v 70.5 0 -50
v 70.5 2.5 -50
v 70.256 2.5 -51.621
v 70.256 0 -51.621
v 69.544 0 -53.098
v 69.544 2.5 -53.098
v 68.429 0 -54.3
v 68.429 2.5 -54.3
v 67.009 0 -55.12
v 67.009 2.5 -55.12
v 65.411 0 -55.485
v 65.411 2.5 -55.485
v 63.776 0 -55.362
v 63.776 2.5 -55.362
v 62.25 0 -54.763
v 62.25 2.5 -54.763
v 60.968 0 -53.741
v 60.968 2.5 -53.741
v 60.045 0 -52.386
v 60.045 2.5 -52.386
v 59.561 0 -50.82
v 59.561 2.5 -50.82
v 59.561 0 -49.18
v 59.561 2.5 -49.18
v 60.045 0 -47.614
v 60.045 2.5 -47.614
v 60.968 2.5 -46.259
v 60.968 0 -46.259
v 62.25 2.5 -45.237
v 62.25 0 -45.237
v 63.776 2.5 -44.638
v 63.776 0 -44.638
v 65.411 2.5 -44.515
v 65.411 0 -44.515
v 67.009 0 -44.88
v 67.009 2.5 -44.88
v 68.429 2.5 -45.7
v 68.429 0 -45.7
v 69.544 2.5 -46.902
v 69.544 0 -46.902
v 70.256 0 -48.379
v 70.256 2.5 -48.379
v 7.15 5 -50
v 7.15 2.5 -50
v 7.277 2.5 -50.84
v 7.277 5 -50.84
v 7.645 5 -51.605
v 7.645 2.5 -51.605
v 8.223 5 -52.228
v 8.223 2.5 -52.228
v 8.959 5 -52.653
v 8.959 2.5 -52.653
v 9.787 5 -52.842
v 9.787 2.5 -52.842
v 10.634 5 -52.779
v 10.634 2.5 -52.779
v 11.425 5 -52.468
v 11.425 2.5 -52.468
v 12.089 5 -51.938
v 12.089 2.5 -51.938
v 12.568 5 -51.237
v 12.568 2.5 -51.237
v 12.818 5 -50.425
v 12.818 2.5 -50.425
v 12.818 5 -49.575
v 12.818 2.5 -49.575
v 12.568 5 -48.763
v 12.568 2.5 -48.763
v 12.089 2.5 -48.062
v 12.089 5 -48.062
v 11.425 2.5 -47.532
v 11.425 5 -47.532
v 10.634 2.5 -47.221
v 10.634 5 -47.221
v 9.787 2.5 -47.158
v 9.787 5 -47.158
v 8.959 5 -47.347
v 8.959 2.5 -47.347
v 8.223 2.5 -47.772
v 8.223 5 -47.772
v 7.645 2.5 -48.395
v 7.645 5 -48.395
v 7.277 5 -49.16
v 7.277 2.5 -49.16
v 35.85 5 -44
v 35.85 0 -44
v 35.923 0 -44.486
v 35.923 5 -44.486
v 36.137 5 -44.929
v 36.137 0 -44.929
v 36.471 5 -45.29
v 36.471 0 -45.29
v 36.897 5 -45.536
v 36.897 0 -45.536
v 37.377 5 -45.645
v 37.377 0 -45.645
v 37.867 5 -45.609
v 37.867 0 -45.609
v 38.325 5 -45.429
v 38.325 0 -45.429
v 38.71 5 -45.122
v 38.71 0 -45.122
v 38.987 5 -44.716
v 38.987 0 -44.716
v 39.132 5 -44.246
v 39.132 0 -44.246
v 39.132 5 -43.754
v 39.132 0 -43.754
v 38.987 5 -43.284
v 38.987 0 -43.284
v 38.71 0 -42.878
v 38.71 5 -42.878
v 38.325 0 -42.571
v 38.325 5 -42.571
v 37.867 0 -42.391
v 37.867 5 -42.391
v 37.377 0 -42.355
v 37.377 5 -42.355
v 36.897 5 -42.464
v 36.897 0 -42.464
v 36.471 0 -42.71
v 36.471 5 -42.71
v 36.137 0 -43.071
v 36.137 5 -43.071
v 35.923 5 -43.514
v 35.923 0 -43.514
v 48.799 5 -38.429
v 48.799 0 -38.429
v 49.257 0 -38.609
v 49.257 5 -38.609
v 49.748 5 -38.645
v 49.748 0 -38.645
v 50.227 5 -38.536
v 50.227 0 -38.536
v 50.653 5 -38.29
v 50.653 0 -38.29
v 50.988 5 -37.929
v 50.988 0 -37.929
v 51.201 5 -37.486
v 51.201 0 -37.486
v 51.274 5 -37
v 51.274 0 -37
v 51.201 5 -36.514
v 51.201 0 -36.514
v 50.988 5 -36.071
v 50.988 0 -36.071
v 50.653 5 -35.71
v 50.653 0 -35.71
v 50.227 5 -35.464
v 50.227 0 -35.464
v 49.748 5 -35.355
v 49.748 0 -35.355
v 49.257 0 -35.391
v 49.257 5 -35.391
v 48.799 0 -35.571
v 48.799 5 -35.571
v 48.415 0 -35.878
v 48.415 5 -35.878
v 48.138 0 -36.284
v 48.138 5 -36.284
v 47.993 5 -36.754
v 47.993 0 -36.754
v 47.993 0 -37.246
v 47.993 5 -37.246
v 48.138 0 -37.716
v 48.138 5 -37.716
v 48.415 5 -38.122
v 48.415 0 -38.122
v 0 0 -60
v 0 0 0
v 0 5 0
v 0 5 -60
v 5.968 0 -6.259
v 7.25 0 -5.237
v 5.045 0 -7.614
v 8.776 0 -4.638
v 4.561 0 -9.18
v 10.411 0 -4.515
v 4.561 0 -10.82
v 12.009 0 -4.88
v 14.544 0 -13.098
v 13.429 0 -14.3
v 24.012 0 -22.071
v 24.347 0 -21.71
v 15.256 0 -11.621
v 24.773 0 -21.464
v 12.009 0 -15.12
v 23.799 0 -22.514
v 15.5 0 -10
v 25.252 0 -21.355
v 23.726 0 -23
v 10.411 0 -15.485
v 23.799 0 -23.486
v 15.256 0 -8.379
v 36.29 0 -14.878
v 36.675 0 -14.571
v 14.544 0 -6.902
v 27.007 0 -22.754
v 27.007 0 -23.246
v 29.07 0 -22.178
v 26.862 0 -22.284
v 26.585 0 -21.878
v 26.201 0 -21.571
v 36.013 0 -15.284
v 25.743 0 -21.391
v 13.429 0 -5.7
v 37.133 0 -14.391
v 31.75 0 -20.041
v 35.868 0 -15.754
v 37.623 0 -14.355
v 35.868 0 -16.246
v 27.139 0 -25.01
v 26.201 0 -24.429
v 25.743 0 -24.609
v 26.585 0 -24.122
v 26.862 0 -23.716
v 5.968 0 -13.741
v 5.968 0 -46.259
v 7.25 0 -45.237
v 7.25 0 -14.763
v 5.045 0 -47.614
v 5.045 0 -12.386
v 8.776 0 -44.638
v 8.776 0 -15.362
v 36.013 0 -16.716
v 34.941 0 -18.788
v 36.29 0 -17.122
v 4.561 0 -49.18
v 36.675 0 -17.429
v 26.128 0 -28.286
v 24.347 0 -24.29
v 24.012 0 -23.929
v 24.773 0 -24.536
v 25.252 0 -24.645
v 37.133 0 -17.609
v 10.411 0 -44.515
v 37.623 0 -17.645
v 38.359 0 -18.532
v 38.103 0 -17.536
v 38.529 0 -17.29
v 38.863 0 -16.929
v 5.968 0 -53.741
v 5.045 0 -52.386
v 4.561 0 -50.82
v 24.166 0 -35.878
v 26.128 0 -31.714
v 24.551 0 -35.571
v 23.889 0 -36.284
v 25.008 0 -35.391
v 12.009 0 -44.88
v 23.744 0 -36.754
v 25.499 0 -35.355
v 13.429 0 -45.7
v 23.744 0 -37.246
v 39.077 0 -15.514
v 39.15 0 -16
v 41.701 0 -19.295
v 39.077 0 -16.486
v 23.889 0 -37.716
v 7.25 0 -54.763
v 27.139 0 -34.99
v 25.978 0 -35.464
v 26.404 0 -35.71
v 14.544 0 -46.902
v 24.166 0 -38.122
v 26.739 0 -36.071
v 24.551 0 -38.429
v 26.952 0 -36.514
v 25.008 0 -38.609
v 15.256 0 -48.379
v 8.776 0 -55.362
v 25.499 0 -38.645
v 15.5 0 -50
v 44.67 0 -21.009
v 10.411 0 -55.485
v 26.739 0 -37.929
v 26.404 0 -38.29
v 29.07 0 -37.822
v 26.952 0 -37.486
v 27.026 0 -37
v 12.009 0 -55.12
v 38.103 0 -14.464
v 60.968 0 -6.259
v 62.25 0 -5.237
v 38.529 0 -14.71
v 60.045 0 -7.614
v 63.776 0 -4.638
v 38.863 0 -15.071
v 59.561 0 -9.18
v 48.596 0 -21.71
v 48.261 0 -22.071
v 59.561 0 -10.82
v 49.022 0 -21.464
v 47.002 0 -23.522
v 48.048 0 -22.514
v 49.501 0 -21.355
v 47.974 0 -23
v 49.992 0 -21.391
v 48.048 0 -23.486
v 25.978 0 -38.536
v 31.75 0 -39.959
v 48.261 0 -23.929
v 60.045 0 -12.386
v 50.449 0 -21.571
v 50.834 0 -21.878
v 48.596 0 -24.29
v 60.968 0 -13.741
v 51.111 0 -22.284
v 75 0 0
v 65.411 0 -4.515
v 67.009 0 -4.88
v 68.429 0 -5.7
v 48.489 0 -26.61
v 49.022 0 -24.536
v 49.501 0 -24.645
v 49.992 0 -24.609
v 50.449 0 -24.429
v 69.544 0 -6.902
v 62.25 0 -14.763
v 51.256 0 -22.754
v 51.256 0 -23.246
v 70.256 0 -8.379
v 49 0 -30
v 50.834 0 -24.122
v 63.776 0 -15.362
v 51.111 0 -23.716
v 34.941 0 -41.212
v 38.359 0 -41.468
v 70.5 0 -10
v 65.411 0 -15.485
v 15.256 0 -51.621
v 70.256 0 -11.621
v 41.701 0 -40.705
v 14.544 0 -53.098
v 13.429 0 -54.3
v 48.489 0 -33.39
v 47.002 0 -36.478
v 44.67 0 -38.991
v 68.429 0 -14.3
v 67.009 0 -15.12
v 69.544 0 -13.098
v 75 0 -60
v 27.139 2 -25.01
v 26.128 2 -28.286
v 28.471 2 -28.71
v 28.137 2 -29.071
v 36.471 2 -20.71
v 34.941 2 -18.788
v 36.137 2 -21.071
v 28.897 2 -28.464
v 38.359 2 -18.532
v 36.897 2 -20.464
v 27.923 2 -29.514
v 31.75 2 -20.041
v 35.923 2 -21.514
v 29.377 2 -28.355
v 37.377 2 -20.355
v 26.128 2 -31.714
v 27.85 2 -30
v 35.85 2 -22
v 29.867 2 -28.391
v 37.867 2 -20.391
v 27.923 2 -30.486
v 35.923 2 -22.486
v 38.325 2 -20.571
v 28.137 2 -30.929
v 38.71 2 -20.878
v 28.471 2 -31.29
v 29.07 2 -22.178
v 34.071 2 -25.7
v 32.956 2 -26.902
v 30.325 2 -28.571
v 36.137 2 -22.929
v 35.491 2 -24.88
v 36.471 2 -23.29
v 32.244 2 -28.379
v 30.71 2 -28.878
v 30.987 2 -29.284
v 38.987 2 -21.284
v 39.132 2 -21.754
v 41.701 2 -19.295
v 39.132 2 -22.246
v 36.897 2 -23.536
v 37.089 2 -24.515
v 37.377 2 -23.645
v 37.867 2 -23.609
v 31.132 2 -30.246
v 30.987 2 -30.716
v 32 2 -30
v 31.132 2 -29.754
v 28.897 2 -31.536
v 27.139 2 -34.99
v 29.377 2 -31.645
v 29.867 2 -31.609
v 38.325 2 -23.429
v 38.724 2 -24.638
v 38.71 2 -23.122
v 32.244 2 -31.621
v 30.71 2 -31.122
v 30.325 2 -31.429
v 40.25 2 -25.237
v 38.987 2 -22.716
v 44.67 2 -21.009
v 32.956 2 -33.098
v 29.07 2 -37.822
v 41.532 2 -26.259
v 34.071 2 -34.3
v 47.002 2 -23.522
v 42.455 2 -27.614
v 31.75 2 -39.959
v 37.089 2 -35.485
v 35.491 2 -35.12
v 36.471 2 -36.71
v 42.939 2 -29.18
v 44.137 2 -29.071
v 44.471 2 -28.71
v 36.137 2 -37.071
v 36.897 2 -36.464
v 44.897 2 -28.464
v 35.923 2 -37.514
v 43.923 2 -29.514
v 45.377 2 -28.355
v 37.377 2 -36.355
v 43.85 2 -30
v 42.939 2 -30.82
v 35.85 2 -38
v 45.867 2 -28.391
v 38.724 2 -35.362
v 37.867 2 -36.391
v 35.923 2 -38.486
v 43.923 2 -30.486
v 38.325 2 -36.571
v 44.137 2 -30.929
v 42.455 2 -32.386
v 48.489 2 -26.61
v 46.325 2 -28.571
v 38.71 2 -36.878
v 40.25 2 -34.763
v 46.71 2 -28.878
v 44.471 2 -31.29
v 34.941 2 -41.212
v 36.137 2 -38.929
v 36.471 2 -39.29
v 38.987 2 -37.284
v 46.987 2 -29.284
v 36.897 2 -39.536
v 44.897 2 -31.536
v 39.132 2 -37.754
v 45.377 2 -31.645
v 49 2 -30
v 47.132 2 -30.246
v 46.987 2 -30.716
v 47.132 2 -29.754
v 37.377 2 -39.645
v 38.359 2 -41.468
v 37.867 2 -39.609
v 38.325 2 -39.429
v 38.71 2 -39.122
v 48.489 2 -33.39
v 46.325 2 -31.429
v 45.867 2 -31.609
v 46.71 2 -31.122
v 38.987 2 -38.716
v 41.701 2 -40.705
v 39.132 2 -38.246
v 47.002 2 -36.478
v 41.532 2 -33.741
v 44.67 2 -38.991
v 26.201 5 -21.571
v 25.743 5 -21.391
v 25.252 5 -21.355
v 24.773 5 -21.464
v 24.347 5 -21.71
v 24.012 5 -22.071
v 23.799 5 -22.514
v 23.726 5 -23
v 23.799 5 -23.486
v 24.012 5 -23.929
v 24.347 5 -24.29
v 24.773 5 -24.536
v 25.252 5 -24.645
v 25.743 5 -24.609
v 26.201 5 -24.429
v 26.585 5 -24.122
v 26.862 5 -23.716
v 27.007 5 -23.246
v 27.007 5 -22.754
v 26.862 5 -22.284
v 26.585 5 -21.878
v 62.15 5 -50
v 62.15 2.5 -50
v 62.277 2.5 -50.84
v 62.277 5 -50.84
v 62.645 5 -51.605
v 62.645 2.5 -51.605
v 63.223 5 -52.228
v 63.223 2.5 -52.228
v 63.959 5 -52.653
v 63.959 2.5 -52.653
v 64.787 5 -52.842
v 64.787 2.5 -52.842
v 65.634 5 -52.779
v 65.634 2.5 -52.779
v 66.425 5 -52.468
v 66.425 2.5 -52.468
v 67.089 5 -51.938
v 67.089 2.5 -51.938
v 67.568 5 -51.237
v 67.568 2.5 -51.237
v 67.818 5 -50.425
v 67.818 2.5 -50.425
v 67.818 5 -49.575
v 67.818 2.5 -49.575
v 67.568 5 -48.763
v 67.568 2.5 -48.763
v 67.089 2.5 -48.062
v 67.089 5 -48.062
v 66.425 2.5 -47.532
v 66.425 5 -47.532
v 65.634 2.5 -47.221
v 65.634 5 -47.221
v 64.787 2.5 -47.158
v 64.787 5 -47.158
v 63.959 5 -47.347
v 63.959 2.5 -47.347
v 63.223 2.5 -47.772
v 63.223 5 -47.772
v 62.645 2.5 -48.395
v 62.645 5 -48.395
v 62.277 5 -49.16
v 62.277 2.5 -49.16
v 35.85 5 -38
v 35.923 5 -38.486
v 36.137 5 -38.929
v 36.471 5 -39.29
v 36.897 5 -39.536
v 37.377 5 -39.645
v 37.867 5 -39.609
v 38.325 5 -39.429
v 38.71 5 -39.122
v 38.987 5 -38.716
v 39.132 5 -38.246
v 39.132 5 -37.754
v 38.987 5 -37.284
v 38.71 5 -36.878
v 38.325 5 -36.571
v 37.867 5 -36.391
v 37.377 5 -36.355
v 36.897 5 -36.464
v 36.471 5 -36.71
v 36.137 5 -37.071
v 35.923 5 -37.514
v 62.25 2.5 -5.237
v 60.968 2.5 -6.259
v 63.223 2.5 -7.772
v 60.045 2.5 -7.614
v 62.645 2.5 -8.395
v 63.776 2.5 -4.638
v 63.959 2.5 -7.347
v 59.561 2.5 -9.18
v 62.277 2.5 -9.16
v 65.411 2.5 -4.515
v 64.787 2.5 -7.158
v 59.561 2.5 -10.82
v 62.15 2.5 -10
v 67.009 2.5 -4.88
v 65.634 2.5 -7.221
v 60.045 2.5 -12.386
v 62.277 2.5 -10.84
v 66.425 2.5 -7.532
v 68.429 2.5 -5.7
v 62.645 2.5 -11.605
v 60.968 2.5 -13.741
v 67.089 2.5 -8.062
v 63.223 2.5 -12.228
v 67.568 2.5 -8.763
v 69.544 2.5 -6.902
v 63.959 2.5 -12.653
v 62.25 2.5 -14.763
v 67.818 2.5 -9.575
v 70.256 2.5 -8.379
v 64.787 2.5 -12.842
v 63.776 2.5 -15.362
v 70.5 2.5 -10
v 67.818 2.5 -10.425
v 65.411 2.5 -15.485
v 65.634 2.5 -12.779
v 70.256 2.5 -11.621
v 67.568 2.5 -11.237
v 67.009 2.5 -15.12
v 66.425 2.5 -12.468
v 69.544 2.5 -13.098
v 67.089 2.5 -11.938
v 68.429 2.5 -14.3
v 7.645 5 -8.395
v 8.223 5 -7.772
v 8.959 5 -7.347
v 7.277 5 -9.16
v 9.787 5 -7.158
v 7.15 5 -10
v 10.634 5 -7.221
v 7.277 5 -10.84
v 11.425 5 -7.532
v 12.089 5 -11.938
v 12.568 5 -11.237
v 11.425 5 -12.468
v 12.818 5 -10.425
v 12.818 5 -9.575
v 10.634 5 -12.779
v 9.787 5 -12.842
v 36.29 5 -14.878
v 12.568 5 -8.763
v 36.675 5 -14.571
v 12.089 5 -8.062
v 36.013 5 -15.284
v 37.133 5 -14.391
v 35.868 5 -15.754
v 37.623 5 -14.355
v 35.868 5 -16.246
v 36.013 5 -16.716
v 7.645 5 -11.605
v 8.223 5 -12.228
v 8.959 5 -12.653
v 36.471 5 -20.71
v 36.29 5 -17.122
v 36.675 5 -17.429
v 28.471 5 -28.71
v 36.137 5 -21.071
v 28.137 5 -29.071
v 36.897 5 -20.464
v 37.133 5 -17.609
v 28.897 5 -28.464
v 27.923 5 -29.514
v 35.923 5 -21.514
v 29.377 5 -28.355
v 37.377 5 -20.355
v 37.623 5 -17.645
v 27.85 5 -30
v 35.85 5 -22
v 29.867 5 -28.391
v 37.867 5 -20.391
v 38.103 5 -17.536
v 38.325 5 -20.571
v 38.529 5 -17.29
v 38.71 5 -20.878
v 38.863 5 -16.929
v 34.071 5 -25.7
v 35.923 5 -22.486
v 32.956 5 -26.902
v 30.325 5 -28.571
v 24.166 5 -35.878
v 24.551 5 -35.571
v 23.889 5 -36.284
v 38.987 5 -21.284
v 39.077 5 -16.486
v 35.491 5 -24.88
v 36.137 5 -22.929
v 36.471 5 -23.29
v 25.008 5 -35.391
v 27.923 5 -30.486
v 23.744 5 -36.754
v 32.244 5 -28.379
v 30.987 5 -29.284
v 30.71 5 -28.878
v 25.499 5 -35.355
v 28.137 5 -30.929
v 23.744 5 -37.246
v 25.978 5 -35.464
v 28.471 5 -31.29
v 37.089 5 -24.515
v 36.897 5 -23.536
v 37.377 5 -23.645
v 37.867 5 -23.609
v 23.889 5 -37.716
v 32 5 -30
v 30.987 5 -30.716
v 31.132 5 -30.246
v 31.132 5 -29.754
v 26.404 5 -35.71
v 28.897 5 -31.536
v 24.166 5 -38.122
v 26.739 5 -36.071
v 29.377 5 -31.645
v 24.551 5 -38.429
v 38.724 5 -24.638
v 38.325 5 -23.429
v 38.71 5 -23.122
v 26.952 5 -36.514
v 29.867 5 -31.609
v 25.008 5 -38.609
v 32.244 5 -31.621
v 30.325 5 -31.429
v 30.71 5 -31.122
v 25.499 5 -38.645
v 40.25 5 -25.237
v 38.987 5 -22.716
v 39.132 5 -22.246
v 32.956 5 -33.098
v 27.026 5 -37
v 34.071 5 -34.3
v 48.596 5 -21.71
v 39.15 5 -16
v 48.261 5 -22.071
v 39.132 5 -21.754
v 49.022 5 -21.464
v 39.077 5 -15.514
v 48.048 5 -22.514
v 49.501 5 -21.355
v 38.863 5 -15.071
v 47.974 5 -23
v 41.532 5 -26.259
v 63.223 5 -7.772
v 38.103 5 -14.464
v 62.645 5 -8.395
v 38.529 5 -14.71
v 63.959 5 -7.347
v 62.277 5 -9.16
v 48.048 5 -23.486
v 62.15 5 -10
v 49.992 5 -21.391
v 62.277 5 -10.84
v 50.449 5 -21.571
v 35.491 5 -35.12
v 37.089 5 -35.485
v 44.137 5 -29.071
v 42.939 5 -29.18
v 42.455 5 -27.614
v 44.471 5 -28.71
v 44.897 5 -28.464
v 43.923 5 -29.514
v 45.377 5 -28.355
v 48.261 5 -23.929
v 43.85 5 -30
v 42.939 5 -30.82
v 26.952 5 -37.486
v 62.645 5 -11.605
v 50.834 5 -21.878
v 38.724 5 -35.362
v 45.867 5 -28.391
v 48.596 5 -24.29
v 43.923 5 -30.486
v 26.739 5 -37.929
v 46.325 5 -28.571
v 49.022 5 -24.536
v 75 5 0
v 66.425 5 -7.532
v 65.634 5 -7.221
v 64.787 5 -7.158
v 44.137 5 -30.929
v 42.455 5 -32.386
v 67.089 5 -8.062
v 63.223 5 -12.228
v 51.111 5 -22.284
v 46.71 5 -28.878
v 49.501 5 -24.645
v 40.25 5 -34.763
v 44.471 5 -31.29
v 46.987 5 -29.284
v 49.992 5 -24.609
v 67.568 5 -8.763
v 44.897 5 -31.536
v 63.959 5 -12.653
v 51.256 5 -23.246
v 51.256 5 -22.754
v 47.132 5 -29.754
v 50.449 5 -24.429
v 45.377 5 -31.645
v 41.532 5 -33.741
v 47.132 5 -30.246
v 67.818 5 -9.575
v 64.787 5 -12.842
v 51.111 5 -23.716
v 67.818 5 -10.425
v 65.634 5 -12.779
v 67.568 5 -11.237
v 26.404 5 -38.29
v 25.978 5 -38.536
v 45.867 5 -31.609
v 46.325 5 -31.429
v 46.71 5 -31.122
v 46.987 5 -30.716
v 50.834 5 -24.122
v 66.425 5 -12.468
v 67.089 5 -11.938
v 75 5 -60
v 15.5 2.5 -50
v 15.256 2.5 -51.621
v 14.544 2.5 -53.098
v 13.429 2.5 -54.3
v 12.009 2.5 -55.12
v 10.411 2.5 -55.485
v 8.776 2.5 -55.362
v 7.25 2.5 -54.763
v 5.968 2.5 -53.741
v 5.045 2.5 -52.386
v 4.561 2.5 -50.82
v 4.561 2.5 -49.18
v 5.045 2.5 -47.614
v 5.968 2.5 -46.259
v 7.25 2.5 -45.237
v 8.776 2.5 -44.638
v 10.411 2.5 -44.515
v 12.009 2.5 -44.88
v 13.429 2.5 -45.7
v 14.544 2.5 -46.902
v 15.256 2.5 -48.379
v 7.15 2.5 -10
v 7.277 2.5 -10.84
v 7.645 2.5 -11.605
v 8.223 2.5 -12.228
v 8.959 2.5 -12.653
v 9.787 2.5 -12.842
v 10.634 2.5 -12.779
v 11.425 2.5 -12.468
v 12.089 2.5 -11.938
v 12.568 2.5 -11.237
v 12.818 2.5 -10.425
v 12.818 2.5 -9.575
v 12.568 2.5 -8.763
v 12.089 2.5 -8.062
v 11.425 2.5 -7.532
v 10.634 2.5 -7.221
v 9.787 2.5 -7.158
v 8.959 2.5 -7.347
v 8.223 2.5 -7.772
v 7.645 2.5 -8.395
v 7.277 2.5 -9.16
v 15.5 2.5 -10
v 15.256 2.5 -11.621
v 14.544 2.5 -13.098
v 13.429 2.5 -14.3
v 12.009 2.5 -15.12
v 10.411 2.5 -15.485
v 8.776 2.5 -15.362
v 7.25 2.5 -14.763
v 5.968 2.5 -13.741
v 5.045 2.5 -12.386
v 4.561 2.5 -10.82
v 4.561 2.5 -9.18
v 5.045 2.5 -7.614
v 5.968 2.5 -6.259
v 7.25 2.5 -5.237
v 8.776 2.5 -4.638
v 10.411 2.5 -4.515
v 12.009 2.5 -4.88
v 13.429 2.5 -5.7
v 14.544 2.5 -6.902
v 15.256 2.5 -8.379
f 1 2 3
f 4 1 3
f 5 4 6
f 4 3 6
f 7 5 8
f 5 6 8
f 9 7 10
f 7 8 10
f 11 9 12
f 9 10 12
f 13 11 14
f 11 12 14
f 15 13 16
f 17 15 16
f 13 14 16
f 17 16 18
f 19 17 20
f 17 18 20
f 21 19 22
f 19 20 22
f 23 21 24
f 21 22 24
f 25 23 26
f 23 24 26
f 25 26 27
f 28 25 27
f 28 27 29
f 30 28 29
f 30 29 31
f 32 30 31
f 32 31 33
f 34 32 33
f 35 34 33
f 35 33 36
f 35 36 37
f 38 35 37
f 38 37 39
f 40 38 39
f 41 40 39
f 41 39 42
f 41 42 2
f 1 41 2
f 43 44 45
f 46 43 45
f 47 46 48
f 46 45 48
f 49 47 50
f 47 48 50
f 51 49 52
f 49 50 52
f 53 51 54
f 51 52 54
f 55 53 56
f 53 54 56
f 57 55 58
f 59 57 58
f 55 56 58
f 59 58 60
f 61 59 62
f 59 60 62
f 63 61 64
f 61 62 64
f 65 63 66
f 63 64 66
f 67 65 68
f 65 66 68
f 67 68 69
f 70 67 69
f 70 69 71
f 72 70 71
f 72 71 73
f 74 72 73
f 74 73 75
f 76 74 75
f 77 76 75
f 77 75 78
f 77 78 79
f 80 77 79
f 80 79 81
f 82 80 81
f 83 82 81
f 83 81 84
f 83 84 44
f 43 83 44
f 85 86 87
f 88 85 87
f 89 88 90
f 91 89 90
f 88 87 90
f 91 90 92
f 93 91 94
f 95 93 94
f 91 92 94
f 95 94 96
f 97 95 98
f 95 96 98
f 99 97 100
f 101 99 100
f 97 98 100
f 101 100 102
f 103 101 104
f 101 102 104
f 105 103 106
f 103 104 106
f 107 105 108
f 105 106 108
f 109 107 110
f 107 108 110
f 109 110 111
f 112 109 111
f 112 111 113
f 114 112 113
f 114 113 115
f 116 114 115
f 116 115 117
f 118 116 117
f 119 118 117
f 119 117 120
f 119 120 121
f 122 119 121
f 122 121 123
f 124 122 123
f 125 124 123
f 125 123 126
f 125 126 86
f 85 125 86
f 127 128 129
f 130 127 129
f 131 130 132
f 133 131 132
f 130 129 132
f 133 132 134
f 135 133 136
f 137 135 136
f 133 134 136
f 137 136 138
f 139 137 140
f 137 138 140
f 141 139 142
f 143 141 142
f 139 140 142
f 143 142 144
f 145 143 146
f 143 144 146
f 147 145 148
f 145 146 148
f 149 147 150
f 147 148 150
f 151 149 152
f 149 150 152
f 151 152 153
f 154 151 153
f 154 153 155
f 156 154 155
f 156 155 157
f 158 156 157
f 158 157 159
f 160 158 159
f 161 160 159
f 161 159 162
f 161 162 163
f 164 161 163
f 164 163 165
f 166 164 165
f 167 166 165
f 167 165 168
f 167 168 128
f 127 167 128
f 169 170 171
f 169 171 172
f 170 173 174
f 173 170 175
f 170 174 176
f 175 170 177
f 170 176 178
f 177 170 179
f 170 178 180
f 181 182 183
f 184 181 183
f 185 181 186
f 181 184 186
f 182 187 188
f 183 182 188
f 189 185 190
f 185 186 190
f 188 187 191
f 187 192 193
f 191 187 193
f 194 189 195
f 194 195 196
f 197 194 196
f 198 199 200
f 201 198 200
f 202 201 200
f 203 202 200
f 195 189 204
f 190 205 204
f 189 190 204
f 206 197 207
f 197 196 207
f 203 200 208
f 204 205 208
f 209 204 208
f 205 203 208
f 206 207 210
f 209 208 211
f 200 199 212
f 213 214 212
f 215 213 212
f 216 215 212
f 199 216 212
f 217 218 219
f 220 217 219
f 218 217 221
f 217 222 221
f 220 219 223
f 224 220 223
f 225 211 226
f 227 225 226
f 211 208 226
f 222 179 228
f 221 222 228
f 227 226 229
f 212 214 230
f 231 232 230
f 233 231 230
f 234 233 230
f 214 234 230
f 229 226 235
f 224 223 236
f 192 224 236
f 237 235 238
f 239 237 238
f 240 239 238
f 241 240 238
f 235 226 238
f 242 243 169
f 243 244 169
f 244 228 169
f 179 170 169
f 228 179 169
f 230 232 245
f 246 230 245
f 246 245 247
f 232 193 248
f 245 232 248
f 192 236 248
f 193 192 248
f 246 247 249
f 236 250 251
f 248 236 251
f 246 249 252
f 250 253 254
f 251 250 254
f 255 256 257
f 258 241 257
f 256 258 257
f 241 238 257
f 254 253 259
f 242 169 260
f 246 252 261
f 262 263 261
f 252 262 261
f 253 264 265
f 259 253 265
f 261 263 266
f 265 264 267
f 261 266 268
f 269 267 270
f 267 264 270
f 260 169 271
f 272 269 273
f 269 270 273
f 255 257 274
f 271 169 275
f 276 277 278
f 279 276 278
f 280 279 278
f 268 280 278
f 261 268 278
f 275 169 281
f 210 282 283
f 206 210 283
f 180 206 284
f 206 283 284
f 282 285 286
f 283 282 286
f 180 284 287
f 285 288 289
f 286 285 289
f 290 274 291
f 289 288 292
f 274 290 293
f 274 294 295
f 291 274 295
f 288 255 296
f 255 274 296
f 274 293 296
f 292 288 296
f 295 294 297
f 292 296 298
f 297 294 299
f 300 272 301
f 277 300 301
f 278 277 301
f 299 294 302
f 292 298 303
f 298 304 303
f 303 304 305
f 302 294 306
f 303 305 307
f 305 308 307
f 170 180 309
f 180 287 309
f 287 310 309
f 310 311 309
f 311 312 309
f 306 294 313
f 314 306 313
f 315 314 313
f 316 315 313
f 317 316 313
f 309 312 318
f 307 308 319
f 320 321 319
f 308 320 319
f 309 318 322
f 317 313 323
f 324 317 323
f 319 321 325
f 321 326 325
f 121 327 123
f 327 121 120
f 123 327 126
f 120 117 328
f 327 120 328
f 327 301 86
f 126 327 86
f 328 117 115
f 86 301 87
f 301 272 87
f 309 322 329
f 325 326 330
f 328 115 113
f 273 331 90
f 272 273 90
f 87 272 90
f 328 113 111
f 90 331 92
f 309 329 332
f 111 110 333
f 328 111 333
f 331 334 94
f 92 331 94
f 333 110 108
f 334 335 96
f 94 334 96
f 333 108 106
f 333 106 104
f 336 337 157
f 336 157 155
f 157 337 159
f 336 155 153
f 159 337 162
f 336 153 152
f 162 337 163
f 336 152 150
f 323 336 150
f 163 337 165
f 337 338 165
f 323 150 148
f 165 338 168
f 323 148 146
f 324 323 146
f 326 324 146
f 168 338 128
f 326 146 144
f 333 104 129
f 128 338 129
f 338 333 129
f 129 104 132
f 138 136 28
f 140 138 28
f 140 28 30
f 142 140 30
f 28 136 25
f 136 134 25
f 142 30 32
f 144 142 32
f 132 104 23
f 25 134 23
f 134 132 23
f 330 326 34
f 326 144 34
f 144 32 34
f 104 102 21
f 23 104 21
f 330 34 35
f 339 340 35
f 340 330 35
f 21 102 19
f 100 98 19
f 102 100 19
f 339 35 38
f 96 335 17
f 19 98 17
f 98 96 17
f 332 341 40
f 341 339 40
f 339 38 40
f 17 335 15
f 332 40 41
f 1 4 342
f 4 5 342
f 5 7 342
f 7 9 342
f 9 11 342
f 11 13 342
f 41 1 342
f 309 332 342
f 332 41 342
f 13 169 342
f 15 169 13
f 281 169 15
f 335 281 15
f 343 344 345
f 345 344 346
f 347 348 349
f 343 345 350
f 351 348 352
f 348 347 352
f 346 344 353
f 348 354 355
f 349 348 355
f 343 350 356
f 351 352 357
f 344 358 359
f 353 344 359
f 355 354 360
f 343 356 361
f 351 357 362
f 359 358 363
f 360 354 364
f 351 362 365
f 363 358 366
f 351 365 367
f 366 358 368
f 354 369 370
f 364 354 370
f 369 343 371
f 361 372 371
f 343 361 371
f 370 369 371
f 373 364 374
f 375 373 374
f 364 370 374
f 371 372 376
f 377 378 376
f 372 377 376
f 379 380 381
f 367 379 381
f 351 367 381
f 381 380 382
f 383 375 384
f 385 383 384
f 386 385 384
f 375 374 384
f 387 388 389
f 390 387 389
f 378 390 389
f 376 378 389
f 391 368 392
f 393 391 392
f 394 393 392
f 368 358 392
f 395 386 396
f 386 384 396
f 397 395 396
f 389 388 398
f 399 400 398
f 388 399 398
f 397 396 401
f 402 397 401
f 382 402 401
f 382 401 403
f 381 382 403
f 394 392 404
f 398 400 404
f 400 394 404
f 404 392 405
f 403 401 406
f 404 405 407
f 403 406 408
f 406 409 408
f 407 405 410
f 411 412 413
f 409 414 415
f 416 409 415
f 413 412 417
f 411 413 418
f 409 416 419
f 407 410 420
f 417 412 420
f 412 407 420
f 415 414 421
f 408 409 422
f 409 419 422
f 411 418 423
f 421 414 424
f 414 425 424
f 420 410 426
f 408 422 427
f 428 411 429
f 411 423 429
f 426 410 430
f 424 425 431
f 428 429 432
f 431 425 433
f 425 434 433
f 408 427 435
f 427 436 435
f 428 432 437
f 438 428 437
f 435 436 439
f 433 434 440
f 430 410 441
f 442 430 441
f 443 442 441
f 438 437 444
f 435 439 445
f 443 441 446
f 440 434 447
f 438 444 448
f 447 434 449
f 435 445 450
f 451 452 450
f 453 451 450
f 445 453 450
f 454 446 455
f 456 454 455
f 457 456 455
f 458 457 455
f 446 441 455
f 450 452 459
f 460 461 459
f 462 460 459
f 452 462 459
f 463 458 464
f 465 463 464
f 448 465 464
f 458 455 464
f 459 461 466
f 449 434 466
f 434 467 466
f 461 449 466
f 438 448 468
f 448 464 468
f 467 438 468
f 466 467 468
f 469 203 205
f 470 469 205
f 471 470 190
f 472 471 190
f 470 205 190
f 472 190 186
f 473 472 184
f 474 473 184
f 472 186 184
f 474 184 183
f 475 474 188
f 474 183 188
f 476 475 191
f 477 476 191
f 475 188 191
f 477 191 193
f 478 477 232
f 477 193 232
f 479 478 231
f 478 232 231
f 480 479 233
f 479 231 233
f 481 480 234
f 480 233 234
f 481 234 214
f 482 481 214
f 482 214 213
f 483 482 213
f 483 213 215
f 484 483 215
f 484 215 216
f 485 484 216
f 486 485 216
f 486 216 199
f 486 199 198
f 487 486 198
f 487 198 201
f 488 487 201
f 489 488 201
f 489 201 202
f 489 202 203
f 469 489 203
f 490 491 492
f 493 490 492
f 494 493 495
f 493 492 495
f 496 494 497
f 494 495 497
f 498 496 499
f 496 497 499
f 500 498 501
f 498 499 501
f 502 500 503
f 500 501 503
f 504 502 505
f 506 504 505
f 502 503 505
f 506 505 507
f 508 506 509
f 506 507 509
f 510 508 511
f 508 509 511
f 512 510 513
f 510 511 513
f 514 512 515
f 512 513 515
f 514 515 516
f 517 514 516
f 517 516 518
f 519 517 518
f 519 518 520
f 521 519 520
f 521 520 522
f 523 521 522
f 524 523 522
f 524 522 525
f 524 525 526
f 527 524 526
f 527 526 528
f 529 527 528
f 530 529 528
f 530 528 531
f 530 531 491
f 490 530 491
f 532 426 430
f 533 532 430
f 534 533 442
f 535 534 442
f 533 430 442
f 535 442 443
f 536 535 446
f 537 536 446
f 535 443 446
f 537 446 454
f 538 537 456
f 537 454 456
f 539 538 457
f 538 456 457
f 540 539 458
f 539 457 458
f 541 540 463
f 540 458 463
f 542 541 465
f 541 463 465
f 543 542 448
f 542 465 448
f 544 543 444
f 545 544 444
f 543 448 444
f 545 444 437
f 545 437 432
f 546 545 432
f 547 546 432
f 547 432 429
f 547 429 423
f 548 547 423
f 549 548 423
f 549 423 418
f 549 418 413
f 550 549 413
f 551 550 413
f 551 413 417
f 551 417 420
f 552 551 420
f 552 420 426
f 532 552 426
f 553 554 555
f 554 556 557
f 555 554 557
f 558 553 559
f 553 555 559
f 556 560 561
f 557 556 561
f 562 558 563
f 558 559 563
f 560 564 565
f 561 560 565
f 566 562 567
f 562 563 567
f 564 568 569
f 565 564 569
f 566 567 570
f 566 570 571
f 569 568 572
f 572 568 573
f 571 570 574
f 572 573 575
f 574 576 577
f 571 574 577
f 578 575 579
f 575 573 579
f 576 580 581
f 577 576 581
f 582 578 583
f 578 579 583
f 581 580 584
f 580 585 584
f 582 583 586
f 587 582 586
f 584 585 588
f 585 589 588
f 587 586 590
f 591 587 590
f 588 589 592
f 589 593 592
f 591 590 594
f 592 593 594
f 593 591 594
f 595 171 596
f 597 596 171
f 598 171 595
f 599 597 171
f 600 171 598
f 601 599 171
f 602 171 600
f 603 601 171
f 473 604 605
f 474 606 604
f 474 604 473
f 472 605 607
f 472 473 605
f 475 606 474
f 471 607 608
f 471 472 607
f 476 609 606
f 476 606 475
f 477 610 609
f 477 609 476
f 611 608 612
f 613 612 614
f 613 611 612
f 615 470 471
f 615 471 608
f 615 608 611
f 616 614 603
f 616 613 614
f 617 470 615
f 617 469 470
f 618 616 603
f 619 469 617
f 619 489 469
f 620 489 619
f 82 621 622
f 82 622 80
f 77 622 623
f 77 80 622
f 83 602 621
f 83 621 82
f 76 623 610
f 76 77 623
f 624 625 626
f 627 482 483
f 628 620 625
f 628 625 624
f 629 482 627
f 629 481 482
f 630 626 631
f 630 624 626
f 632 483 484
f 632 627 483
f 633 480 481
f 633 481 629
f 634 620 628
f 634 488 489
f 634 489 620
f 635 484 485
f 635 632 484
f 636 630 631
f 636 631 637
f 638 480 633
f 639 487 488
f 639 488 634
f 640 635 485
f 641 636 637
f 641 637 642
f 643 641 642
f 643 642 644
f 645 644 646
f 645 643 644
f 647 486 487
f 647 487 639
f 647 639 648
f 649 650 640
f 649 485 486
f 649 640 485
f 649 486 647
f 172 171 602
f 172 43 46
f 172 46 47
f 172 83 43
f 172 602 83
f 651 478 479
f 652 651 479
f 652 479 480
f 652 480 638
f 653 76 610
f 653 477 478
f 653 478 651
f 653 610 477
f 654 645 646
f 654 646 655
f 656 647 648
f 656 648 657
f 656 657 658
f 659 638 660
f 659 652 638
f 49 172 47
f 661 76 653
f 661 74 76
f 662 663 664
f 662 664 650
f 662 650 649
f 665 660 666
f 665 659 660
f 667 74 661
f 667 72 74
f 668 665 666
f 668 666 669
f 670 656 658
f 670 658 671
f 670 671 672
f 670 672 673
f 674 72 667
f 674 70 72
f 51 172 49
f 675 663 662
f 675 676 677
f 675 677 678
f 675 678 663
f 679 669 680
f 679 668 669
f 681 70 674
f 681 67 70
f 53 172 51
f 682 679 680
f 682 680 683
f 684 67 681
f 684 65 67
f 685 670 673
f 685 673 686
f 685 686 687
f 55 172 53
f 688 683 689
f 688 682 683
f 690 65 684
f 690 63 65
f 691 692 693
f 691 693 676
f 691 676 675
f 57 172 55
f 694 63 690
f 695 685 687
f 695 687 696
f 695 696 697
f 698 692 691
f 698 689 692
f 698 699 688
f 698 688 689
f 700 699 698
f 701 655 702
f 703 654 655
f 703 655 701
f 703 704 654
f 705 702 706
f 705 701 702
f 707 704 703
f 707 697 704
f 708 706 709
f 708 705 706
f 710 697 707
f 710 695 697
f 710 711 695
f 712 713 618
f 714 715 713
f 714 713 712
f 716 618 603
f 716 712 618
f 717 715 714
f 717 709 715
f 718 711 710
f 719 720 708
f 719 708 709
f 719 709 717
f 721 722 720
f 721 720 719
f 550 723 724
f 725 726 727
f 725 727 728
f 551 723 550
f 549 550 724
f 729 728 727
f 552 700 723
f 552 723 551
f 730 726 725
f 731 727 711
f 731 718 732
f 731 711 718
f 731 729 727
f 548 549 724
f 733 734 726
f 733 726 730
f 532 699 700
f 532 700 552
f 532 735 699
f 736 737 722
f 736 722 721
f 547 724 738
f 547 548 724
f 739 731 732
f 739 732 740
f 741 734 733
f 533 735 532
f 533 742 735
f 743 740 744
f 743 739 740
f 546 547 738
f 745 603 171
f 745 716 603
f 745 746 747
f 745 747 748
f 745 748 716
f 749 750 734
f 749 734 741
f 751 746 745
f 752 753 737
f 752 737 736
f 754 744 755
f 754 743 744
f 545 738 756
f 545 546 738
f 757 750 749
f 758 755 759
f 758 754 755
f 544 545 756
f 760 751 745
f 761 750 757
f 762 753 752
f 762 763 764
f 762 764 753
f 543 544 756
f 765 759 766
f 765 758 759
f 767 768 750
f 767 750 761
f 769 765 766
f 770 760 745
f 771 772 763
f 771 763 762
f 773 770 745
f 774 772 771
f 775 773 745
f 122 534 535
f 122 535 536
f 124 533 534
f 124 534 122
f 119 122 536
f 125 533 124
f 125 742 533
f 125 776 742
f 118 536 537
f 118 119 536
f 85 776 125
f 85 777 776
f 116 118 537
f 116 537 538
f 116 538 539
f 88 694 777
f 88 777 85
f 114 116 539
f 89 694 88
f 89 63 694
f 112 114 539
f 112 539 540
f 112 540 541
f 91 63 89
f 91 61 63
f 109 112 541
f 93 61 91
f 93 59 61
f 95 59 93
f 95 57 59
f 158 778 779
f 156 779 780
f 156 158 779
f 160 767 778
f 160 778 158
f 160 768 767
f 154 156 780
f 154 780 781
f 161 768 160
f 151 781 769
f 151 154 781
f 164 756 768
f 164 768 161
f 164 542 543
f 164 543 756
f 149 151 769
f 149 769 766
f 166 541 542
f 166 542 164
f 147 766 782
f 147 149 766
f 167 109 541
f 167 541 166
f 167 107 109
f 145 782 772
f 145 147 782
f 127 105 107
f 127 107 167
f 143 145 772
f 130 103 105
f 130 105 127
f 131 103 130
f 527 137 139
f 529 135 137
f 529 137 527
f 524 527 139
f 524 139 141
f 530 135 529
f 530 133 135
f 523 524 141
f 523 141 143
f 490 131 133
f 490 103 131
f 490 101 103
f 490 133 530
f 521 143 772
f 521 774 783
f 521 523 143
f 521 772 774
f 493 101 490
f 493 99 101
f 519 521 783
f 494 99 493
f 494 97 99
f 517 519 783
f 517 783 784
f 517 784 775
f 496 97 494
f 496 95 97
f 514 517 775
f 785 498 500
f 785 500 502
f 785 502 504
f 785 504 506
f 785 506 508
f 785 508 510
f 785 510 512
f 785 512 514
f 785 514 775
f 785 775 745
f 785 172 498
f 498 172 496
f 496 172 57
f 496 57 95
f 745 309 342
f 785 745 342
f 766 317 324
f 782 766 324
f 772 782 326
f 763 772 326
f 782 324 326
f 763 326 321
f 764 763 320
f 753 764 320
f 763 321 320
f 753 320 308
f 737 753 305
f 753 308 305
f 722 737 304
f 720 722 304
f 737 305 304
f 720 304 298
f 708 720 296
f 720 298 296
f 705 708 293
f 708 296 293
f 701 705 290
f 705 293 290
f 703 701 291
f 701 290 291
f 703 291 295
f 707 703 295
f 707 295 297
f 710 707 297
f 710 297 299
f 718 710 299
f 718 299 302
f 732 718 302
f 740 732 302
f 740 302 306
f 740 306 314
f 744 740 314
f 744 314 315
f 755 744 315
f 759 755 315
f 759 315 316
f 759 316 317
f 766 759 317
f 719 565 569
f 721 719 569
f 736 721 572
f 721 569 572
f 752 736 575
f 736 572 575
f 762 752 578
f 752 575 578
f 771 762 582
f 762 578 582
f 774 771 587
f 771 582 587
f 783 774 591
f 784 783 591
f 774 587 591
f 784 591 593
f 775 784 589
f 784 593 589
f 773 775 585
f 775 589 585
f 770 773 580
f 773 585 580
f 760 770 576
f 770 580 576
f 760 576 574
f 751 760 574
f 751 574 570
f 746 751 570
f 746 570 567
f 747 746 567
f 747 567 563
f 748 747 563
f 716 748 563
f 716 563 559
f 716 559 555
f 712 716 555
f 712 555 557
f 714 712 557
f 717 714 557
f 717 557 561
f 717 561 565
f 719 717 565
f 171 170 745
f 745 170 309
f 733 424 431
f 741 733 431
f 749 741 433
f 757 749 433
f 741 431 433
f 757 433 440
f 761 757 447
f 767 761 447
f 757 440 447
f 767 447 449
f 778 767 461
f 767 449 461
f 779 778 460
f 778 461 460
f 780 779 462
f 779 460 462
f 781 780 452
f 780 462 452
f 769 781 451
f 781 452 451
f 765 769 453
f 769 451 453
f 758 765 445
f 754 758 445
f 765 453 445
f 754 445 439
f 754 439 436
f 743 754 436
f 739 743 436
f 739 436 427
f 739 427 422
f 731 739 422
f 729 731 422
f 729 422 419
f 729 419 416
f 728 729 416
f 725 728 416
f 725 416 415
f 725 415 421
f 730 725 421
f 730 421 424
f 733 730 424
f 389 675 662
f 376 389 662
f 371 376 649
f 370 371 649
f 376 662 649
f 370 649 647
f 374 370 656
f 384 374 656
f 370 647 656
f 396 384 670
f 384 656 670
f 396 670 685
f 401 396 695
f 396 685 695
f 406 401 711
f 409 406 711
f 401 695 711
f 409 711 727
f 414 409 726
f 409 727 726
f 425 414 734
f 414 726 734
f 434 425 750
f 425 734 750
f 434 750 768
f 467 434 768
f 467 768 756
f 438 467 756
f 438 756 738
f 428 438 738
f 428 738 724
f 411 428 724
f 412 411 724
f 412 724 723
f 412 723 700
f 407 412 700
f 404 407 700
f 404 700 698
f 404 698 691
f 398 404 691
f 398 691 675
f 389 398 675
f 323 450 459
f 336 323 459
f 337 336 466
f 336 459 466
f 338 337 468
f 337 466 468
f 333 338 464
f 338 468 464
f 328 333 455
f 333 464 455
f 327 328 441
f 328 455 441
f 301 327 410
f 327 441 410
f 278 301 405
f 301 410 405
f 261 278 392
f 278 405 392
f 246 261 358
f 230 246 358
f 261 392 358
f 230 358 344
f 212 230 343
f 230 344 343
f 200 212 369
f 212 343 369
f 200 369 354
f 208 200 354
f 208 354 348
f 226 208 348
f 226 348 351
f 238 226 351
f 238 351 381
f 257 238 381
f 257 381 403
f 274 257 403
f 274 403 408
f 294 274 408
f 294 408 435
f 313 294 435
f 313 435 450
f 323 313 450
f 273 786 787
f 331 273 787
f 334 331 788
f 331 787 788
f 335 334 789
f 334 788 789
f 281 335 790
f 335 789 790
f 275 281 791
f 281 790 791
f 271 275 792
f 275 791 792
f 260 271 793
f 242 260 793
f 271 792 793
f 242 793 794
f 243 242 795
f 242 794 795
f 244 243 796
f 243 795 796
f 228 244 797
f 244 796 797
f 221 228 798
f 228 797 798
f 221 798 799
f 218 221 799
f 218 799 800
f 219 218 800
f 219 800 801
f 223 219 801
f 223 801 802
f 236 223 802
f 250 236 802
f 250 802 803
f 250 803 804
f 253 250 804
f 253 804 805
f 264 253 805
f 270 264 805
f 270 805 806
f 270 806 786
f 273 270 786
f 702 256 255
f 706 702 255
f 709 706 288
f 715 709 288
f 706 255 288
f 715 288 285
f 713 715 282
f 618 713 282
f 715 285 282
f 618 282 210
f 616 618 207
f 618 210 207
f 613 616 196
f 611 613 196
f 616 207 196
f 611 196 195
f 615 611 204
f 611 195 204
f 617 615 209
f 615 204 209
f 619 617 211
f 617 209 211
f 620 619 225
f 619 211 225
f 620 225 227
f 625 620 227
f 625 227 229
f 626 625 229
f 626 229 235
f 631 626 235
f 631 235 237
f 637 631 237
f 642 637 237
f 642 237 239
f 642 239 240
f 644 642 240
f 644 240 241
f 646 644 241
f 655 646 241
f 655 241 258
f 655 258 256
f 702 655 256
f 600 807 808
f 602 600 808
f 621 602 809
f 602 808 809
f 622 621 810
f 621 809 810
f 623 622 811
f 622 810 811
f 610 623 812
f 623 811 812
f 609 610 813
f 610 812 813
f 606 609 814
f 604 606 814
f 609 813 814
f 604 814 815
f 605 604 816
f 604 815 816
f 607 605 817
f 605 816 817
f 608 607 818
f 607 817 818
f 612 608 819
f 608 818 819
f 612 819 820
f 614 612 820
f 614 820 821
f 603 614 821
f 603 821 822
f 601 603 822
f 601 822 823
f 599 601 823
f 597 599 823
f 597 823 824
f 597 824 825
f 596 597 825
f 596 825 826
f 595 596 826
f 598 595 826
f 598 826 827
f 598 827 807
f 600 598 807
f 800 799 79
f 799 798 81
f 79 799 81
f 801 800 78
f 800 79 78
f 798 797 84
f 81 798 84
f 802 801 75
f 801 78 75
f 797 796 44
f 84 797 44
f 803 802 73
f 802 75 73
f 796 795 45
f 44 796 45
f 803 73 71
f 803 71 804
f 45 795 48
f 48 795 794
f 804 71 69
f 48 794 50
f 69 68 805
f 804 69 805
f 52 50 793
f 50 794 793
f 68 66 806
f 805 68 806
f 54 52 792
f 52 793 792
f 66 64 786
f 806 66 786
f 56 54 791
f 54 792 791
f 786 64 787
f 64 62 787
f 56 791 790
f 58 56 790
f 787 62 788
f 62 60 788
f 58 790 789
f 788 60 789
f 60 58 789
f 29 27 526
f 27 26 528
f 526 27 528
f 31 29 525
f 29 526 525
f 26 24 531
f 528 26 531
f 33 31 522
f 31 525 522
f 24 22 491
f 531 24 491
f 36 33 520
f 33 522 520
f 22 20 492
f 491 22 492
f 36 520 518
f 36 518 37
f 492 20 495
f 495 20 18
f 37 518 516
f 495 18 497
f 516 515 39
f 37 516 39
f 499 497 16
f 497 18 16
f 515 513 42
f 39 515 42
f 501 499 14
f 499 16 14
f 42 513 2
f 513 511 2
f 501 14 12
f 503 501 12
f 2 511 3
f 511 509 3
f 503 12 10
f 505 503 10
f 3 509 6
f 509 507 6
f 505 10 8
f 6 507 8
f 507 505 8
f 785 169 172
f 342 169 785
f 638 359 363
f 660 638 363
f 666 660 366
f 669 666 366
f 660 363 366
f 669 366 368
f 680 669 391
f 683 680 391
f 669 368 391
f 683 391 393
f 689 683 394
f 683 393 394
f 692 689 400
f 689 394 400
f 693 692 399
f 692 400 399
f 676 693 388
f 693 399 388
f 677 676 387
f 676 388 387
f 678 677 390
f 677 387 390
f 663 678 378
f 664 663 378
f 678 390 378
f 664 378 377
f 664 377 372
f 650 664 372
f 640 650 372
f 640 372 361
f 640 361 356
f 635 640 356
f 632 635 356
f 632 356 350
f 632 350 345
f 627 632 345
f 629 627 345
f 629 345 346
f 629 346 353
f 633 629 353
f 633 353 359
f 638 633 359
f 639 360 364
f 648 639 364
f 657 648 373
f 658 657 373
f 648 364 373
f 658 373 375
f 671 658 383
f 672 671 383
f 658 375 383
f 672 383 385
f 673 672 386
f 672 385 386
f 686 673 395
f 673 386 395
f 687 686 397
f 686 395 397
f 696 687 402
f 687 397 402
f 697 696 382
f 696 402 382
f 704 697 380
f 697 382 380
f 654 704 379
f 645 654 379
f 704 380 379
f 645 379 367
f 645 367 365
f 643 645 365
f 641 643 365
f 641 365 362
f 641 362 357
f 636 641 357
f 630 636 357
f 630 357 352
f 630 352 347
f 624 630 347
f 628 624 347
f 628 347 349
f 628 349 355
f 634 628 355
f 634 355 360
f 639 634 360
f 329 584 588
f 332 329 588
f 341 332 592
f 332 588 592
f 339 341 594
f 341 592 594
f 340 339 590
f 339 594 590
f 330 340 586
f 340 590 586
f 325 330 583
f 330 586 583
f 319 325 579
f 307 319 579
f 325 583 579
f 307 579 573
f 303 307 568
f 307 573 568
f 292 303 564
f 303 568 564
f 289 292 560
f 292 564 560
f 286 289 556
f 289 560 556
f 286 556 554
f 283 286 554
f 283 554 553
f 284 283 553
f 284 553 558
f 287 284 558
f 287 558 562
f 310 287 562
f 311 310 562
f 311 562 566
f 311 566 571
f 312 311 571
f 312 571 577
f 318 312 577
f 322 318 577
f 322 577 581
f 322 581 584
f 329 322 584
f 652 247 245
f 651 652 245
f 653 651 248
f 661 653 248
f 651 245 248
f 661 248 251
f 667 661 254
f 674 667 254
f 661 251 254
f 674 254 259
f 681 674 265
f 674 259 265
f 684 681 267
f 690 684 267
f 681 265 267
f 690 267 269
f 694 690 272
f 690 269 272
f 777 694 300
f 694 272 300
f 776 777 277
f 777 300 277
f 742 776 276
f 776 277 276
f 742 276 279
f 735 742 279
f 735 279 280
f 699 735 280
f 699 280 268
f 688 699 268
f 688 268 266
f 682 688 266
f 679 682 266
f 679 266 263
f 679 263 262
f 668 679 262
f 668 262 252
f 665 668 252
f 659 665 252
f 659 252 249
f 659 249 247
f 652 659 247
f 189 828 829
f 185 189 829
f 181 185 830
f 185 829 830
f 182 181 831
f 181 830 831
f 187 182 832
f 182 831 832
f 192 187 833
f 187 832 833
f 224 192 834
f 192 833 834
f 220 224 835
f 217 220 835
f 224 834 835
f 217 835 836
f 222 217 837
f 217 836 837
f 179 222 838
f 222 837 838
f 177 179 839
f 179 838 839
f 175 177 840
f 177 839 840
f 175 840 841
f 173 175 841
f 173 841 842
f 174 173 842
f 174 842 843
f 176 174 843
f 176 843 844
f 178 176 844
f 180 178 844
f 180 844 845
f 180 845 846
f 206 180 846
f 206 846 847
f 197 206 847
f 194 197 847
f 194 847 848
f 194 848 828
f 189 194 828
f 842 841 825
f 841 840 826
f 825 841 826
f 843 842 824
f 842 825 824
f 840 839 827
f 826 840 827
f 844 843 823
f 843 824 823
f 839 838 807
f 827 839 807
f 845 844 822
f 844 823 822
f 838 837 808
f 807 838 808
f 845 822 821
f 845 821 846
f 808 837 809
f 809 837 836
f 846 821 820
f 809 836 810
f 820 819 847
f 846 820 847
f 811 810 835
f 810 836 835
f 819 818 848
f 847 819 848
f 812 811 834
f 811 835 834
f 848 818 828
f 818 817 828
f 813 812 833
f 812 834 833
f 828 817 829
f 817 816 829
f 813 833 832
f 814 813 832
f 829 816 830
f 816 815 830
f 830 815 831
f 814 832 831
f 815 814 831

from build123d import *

# Parameters (mm, degrees)
SKETCH_1_W               = 75
SKETCH_1_H               = 60
EXTRUDE_1_DEPTH          = 5
HOLE_WIZARD_1_D          = 5.7
CUT_EXTRUDE_1_DEPTH      = 10
HOLE_WIZARD_2_D          = 3.3
PATTERN_CIRCULAR_1_COUNT = 6
HOLE_WIZARD_3_D          = 11
HOLE_WIZARD_3_DEPTH      = 2.5
HOLE_WIZARD_4_D          = 3.3
HOLE_WIZARD_5_D          = 23
HOLE_WIZARD_5_DEPTH      = 2


with BuildPart() as part:
    # 草图1 → 凸台-拉伸1 (new body)
    with BuildSketch(Plane(origin=(0, 0, 0), x_dir=(1, 0, 0), z_dir=(0, 1, 0))):
        with Locations((37.5, 30)):
            Rectangle(SKETCH_1_W, SKETCH_1_H)
    extrude(amount=EXTRUDE_1_DEPTH)

    # 孔1 (through all)
    with Locations(Plane(origin=(0, 5, 0), x_dir=(1, 0, 0), z_dir=(0, 1, 0))):
        with Locations((10, 50), (10, 10), (65, 10), (65, 50)):
            Hole(HOLE_WIZARD_1_D / 2)

    # 草图6 → 切除-拉伸1 (cut)
    with BuildSketch(Plane(origin=(0, 5, 0), x_dir=(1, 0, 0), z_dir=(0, 1, 0))):
        with BuildLine():
            ThreePointArc((43, 30), (37.5, 35.5), (32, 30))
            Line((32, 30), (43, 30))
        make_face()
        with BuildLine():
            Line((43, 30), (32, 30))
            ThreePointArc((32, 30), (37.5, 24.5), (43, 30))
        make_face()
    extrude(amount=-CUT_EXTRUDE_1_DEPTH, mode=Mode.SUBTRACT)

    # 孔2 (through all)
    with Locations(Plane(origin=(0, 5, 0), x_dir=(1, 0, 0), z_dir=(0, 1, 0))):
        with Locations((37.5, 44)):
            hole_wizard_2 = Hole(HOLE_WIZARD_2_D / 2)

    # 阵列(圆周)1: 孔2 ×6 about axis
    pattern_circular_1_axis = Axis((37.5, 0, -30), (0, 1, 0))
    for i in range(1, PATTERN_CIRCULAR_1_COUNT):
        add(hole_wizard_2.rotate(pattern_circular_1_axis, i * 360 / PATTERN_CIRCULAR_1_COUNT), mode=Mode.SUBTRACT)

    # 孔3
    with Locations(Plane(origin=(0, 0, 0), x_dir=(-1, 0, 0), z_dir=(0, -1, 0))):
        with Locations((-10, 10), (-10, 50), (-65, 50), (-65, 10)):
            Hole(HOLE_WIZARD_3_D / 2, depth=HOLE_WIZARD_3_DEPTH)

    # 孔4 (through all)
    with Locations(Plane(origin=(0, 5, 0), x_dir=(1, 0, 0), z_dir=(0, 1, 0))):
        with Locations((29.5, 30), (37.5, 38), (45.5, 30), (37.5, 22)):
            Hole(HOLE_WIZARD_4_D / 2)

    # 孔5
    with Locations(Plane(origin=(0, 0, 0), x_dir=(-1, 0, 0), z_dir=(0, -1, 0))):
        with Locations((-37.5, 30)):
            Hole(HOLE_WIZARD_5_D / 2, depth=HOLE_WIZARD_5_DEPTH)


solid = part.part
